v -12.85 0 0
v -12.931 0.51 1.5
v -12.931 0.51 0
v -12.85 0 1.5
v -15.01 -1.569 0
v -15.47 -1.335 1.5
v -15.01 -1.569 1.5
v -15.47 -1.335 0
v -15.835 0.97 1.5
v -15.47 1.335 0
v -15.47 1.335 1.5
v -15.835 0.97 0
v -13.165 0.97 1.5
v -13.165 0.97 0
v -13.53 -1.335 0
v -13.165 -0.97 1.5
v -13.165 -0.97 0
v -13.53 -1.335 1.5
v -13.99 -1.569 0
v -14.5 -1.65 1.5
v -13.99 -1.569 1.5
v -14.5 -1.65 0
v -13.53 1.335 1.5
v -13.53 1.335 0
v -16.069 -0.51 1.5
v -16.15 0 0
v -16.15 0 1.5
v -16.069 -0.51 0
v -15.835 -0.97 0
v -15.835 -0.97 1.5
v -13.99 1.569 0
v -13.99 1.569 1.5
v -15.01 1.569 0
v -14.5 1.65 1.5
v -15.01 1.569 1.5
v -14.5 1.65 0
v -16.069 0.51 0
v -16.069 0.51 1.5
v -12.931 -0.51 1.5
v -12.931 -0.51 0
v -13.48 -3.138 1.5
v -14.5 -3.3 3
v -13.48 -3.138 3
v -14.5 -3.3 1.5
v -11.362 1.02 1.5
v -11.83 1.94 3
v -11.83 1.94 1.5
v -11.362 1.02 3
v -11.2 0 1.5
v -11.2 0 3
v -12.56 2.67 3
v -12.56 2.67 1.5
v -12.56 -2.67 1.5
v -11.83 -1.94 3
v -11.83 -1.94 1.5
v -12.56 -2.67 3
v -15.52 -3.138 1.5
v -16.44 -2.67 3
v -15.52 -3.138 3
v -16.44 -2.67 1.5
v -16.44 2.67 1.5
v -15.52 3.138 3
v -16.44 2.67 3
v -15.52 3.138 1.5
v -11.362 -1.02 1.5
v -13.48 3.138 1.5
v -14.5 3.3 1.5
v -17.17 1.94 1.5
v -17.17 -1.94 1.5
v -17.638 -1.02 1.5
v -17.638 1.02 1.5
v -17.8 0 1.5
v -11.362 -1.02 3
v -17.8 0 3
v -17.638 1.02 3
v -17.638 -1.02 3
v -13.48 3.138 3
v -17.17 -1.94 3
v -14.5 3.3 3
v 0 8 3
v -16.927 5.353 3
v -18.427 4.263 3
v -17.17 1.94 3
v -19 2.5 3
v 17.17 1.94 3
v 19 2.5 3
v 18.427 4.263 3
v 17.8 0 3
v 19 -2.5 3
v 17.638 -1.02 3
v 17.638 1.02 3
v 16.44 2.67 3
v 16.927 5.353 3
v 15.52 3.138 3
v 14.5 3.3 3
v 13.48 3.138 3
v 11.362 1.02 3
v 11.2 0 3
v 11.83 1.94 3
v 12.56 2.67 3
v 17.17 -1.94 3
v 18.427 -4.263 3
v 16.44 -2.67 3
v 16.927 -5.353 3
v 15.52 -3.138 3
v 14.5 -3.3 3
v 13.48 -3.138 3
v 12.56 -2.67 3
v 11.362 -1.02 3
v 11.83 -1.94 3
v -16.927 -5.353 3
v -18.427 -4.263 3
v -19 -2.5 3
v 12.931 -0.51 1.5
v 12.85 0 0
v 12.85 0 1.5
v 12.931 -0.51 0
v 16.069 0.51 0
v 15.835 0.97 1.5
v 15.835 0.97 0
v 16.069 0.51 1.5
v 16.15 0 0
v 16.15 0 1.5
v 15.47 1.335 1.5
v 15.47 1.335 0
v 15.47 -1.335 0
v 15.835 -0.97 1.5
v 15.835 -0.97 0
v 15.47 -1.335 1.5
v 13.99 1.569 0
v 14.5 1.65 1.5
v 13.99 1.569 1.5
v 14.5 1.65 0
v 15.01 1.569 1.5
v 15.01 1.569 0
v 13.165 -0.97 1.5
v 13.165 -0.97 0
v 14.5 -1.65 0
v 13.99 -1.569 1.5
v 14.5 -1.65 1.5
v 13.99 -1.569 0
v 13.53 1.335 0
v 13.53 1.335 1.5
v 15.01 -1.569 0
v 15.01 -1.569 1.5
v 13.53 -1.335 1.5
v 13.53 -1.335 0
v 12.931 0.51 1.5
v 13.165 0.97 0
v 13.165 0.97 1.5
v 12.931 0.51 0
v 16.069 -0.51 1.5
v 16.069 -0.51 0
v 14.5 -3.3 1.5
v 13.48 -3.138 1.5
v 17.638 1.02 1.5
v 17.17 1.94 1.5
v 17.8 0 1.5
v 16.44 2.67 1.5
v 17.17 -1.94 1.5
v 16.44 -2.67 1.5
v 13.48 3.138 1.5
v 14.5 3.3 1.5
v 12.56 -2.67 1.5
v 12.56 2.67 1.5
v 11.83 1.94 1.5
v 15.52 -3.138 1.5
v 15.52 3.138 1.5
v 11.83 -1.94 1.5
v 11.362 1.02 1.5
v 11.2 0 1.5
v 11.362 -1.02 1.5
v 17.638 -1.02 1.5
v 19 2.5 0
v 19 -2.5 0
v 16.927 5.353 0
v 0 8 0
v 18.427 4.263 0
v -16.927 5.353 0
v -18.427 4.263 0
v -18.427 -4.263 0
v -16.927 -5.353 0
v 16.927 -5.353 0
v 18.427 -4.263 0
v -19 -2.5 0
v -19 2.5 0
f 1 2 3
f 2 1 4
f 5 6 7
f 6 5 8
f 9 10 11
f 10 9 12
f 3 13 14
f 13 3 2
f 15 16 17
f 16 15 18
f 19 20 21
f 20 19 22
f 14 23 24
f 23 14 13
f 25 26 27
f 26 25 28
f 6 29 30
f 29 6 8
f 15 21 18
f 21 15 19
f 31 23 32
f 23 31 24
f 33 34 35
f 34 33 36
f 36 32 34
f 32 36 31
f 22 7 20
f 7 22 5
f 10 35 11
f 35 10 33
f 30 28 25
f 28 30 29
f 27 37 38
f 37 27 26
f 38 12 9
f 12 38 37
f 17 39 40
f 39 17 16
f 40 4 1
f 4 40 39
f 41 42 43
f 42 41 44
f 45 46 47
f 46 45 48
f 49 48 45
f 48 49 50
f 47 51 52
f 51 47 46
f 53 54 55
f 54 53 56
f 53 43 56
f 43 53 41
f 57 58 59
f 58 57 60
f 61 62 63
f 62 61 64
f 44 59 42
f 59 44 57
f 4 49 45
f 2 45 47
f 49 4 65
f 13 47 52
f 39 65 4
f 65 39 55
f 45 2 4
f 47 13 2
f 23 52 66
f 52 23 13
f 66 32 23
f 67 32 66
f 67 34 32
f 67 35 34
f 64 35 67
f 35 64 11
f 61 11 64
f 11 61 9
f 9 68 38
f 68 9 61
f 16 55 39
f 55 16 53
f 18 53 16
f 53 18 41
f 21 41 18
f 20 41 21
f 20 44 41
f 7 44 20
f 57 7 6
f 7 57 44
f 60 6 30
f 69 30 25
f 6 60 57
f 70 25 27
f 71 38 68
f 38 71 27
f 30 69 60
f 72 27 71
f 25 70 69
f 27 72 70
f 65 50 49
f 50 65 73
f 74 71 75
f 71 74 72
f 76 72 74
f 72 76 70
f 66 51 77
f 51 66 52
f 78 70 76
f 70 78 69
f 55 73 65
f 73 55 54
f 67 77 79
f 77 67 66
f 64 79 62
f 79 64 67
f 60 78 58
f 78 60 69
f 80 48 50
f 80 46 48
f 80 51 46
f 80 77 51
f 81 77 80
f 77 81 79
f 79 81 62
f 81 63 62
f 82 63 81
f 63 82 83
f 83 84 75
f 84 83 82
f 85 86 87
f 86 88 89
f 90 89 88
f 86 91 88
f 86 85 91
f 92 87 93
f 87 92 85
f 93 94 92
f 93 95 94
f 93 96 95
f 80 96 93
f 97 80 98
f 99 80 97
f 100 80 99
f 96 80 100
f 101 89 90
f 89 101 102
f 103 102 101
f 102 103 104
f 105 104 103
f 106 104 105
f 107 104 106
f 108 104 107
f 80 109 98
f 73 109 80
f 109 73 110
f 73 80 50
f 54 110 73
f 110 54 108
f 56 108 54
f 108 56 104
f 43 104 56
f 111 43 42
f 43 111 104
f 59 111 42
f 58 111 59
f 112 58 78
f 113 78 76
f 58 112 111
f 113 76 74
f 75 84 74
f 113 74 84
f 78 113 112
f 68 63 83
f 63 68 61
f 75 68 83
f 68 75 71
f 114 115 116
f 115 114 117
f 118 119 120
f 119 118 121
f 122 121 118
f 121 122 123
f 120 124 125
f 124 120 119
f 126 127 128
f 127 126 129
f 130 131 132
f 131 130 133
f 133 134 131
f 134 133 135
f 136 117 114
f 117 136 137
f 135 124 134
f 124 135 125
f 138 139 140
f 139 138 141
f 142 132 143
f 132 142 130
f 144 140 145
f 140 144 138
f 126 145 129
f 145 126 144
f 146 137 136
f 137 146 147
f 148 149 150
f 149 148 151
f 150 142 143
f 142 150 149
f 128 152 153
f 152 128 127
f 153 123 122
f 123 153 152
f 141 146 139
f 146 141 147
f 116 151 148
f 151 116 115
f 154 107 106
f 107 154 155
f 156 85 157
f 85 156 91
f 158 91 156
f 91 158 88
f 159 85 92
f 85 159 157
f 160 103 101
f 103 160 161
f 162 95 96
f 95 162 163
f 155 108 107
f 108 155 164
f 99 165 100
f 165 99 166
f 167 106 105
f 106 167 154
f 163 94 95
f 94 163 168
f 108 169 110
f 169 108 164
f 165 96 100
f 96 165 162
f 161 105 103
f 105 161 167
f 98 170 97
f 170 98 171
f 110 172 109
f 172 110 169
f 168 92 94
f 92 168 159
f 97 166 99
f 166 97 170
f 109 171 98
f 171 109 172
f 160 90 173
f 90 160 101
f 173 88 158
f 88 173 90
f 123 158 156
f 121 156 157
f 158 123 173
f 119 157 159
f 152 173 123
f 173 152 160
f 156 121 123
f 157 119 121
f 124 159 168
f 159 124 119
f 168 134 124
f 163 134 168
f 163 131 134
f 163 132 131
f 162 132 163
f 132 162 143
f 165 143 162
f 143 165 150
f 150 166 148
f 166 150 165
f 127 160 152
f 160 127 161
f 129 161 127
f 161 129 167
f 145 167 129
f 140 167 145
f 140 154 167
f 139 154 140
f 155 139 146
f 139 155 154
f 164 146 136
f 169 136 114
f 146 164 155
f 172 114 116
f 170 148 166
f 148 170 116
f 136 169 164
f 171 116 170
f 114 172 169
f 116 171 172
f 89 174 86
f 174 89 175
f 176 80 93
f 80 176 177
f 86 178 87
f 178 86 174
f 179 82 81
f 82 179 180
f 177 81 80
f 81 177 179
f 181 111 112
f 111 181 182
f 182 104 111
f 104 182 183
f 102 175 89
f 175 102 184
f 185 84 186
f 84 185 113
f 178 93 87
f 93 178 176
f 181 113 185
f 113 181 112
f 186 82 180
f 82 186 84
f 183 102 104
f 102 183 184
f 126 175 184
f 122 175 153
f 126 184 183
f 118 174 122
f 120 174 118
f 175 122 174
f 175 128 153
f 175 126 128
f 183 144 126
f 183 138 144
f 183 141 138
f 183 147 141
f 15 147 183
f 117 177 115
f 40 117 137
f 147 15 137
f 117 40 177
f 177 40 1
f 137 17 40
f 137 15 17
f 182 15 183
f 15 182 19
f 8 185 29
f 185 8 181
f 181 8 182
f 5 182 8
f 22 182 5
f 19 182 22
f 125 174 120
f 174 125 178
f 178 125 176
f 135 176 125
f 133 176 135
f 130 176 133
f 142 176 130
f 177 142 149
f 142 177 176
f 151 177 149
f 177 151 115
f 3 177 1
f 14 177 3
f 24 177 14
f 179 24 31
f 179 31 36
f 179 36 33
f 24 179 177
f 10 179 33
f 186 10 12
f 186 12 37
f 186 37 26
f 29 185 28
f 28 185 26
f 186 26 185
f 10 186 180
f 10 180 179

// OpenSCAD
// file: dronePlates.scad
/**
 * dronePlates.scad
 * Plate library
 *
 * GNU GPL V3
 * @author: Victor Potenciano
 */

m3Rad = 3.4/2;
cornerR = 4;

/**
 *
 */
module helperDisk(diameter) {
	cylinder(r = diameter/2, h = 0.6, $fn=20);
}

/**
 *
 */
module roundedRect(size, radius) {
	x = size[0];
	y = size[1];
	z = size[2];

	linear_extrude(height=z)
	hull() {
	// place 4 circles in the corners, with the given radius
	translate([(-x/2)+(radius/2), (-y/2)+(radius/2), 0]){ circle(r=radius); }
	translate([(x/2)-(radius/2), (-y/2)+(radius/2), 0]){ circle(r=radius); }
	translate([(-x/2)+(radius/2), (y/2)-(radius/2), 0]){ circle(r=radius); }
	translate([(x/2)-(radius/2), (y/2)-(radius/2), 0]){ circle(r=radius); }
	}
}

/**
 * rounded rectangle triangle with corner at origin
 */
module roundedTriangle(size, radius) {
	x = size[0];
	y = size[1];
	z = size[2];

	linear_extrude(height=z)
	hull() {
	translate([radius, radius, 0]){ circle(r=radius); }
	translate([x-radius, radius, 0]){ circle(r=radius); }
	translate([radius, y-radius, 0]){ circle(r=radius); }
	}
}

/**
 *
 */
module roundRectPlate(w, l, plateThick=3) {
	difference(){
		roundedRect([l+m3Rad*1.75,w+m3Rad*1.75,plateThick], cornerR);
		translate([l/2, w/2, -0.5]) { cylinder(h = plateThick+1, r = m3Rad, $fn=30); }
		translate([-l/2, w/2, -0.5]) { cylinder(h = plateThick+1, r = m3Rad, $fn=30); }
		translate([l/2, -w/2, -0.5]) { cylinder(h = plateThick+1, r = m3Rad, $fn=30); }
		translate([-l/2, -w/2, -0.5]) { cylinder(h = plateThick+1, r = m3Rad, $fn=30); }
	}
}

/**
 *
 */
module crossSquarePlate(l, thick=3) {
	inDist = cornerR*2+4;
	trianL = sqrt((l*l)/2)-inDist;
	centerR = 4;

	difference(){
		roundRectPlate(l, l, thick);
		translate([0, centerR, -0.5]) { 
			rotate([0,0,45]){ roundedTriangle([trianL,trianL,thick+1], cornerR-2); }
		}
		translate([0, -centerR, -0.5]) { 
			rotate([0,0,225]){ roundedTriangle([trianL,trianL,thick+1], cornerR-2); }
		}
		translate([-centerR, 0, -0.5]) { 
			rotate([0,0,135]){ roundedTriangle([trianL,trianL,thick+1], cornerR-2); }
		}
		translate([centerR, 0, -0.5]) { 
			rotate([0,0,-45]){ roundedTriangle([trianL,trianL,thick+1], cornerR-2); }
		}
	}
}

/**
 *
 */
module hShapePlate(w, l, thick=4) {
	inDist = cornerR*2+1;

	difference(){
		roundRectPlate(w, l, thick);
		translate([0, w/4, -0.5]) { roundedRect([l-inDist,w/2-inDist,thick+1], cornerR-2); }
		translate([0, -w/4, -0.5]) { roundedRect([l-inDist,w/2-inDist,thick+1], cornerR-2); }
	}
}

/**
 *
 */
module motorCircleMount(inDia, outDia, thick=3, extraH=false, d1=19, d2=16, holeR=m3Rad ) {
	difference(){
		cylinder(h = thick, r = outDia/2, $fn=30);
		motorCircleMountHoles(inDia, outDia, thick, extraH, d1=d1, d2=d2, holeR=holeR);
	}
}

/**
 *
 */
module motorCircleMountHoles(inDia, outDia, thick=3, extraH=false, d1=19, d2=16, d3=25, holeR=m3Rad) {
	translate([0, 0, -0.5]) { cylinder(h = thick+1, r = inDia/2, $fn=30); }

	for(i=[0:3]) {
		rotate([0,0,90*i]){
		translate([d1/2, 0, -0.5]) cylinder(h = thick+1, r = holeR, $fn=20);
		translate([d2/2, 0, -0.5]) cylinder(h = thick+1, r = holeR, $fn=20);
		translate([d2/2, -holeR, -0.5]) cube(size = [(d1-d2)/2,holeR*2,thick+1]);
		}
	}
	
	if(extraH==true){	
		for(i=[-1,1]) translate([i*d3/2, 0, -0.5]) { cylinder(h = thick+1, r = holeR, $fn=30); }
	}
}

/**
 *
 */
module motorRectMount(w, l, inDia, thick=3) {
	d1=19;
	d2=16;

	difference(){
		roundRectPlate(w, l, thick);
		translate([0, 0, -0.5]) { cylinder(h = thick+1, r = inDia/2, $fn=30); }
		translate([0, d1/2, -0.5]) { cylinder(h = thick+1, r = m3Rad, $fn=30); }
		translate([0, -d1/2, -0.5]) { cylinder(h = thick+1, r = m3Rad, $fn=30); }
		translate([d2/2, 0, -0.5]) { cylinder(h = thick+1, r = m3Rad, $fn=30); }
		translate([-d2/2, 0, -0.5]) { cylinder(h = thick+1, r = m3Rad, $fn=30); }
	}
}

/**
 *
 */
module tube(inDia, outDia, height) {
	difference(){
		cylinder(h = height, r = outDia/2, $fn=50);
		translate([0, 0, -0.5]) { cylinder(h = height+1, r = inDia/2, $fn=30); }
	}
}

/**
 *
 */
module squareTube(inDia, outDia, height) {
	translate([0,0,height/2]){
	difference(){
		cube(size = [outDia,outDia,height], center = true);
		cube(size = [inDia,inDia,height+1], center = true);
	}
	}
}

/**
 *
 */
module djiFlamewheelHoles(height) {
	a = 23;
	b = 16;
	c = 19.5;
	
	translate([a/2, c/2, 0]) { cylinder(h = height, r = m3Rad, $fn=30); }
	translate([-a/2, c/2, 0]) { cylinder(h = height, r = m3Rad, $fn=30); }
	translate([b/2, -c/2, 0]) { cylinder(h = height, r = m3Rad, $fn=30); }
	translate([-b/2, -c/2, 0]) { cylinder(h = height, r = m3Rad, $fn=30); }
}

/**
 *
 */
module djiFlamewheelHolesBotton(height) {
	a1 = 21;
	c = 19.5;
	
	translate([a1/2, c/2, 0]) { cylinder(h = height, r = m3Rad, $fn=30); }
	translate([-a1/2, c/2, 0]) { cylinder(h = height, r = m3Rad, $fn=30); }
}

/**
 *
 */
module propeller(size){
union(){
difference(){
	cylinder(h = 3, r = size/2, center=true, $fn=30);
	cylinder(h = 3.1, r = size/2-2, center=true, $fn=30); 
}
for( i = [-1,1] ){
rotate([0,0,45*i]){ cube(size = [size,4,1], center = true); }
}
}
}

/**
 *
 */
module slot(length, height, rad){
for(i=[-1,1]) translate([i*length/2,0,0]) cylinder(h = height, r = rad, $fn=30);
translate([0,0,height/2]) cube(size = [length,rad*2,height], center = true);
}

 

////////////////////////
// Examples:
////////////////////////

motorCircleMount(8, 25, 3.5);

//roundedRect([50,50,3], 4);

//hShapePlate(79, 25);

//rotate([0,0,45]){roundedTriangle([40,40,3], 4);}

//crossSquarePlate(45, 4);

/*
union(){
motorRectMount(21, 18, 8, 4);
translate([9, 10.5, 0]) {tube(m3Rad*2, 6.5, 6);}
}
*/

/*
difference(){
union(){
hShapePlate(50, 30, 3.5);
translate([-4,-25,0]){cube(size = [8,50,3.5]);}
rotate([0, 0, 45]) {motorCircleMount(8, 35, 3.5);}
}
cylinder(h = 10, r = 4, $fn=100, center=true);
}
*/

//rotate([90,0,0]){ tube(5,10,20); }
//translate([20,0,0]){ squareTube(5, 10, 20); }
// main file
/**
 * alien bumper
 */

use <dronePlates.scad>;

holeDist = 29;
m3Rad = 3.3/2;
thick = 3;
width = 38;
length = 11;
holeShift = 0;


//translate([0,20,0]) cube(size=[width,2,2], center=true);

difference(){
hull(){
    roundedRect([width-3,length-3,thick], 3);
    translate([0,3,0]) cylinder(r=5, h=thick, $fn=20);
}

for(i=[-1,1]){
translate([i*holeDist/2, holeShift, -0.5]) cylinder(r=m3Rad, h=thick+1, $fn=20);
translate([i*holeDist/2, holeShift, thick/2]) cylinder(r=m3Rad*2, h=thick/2, $fn=20);
}

}
